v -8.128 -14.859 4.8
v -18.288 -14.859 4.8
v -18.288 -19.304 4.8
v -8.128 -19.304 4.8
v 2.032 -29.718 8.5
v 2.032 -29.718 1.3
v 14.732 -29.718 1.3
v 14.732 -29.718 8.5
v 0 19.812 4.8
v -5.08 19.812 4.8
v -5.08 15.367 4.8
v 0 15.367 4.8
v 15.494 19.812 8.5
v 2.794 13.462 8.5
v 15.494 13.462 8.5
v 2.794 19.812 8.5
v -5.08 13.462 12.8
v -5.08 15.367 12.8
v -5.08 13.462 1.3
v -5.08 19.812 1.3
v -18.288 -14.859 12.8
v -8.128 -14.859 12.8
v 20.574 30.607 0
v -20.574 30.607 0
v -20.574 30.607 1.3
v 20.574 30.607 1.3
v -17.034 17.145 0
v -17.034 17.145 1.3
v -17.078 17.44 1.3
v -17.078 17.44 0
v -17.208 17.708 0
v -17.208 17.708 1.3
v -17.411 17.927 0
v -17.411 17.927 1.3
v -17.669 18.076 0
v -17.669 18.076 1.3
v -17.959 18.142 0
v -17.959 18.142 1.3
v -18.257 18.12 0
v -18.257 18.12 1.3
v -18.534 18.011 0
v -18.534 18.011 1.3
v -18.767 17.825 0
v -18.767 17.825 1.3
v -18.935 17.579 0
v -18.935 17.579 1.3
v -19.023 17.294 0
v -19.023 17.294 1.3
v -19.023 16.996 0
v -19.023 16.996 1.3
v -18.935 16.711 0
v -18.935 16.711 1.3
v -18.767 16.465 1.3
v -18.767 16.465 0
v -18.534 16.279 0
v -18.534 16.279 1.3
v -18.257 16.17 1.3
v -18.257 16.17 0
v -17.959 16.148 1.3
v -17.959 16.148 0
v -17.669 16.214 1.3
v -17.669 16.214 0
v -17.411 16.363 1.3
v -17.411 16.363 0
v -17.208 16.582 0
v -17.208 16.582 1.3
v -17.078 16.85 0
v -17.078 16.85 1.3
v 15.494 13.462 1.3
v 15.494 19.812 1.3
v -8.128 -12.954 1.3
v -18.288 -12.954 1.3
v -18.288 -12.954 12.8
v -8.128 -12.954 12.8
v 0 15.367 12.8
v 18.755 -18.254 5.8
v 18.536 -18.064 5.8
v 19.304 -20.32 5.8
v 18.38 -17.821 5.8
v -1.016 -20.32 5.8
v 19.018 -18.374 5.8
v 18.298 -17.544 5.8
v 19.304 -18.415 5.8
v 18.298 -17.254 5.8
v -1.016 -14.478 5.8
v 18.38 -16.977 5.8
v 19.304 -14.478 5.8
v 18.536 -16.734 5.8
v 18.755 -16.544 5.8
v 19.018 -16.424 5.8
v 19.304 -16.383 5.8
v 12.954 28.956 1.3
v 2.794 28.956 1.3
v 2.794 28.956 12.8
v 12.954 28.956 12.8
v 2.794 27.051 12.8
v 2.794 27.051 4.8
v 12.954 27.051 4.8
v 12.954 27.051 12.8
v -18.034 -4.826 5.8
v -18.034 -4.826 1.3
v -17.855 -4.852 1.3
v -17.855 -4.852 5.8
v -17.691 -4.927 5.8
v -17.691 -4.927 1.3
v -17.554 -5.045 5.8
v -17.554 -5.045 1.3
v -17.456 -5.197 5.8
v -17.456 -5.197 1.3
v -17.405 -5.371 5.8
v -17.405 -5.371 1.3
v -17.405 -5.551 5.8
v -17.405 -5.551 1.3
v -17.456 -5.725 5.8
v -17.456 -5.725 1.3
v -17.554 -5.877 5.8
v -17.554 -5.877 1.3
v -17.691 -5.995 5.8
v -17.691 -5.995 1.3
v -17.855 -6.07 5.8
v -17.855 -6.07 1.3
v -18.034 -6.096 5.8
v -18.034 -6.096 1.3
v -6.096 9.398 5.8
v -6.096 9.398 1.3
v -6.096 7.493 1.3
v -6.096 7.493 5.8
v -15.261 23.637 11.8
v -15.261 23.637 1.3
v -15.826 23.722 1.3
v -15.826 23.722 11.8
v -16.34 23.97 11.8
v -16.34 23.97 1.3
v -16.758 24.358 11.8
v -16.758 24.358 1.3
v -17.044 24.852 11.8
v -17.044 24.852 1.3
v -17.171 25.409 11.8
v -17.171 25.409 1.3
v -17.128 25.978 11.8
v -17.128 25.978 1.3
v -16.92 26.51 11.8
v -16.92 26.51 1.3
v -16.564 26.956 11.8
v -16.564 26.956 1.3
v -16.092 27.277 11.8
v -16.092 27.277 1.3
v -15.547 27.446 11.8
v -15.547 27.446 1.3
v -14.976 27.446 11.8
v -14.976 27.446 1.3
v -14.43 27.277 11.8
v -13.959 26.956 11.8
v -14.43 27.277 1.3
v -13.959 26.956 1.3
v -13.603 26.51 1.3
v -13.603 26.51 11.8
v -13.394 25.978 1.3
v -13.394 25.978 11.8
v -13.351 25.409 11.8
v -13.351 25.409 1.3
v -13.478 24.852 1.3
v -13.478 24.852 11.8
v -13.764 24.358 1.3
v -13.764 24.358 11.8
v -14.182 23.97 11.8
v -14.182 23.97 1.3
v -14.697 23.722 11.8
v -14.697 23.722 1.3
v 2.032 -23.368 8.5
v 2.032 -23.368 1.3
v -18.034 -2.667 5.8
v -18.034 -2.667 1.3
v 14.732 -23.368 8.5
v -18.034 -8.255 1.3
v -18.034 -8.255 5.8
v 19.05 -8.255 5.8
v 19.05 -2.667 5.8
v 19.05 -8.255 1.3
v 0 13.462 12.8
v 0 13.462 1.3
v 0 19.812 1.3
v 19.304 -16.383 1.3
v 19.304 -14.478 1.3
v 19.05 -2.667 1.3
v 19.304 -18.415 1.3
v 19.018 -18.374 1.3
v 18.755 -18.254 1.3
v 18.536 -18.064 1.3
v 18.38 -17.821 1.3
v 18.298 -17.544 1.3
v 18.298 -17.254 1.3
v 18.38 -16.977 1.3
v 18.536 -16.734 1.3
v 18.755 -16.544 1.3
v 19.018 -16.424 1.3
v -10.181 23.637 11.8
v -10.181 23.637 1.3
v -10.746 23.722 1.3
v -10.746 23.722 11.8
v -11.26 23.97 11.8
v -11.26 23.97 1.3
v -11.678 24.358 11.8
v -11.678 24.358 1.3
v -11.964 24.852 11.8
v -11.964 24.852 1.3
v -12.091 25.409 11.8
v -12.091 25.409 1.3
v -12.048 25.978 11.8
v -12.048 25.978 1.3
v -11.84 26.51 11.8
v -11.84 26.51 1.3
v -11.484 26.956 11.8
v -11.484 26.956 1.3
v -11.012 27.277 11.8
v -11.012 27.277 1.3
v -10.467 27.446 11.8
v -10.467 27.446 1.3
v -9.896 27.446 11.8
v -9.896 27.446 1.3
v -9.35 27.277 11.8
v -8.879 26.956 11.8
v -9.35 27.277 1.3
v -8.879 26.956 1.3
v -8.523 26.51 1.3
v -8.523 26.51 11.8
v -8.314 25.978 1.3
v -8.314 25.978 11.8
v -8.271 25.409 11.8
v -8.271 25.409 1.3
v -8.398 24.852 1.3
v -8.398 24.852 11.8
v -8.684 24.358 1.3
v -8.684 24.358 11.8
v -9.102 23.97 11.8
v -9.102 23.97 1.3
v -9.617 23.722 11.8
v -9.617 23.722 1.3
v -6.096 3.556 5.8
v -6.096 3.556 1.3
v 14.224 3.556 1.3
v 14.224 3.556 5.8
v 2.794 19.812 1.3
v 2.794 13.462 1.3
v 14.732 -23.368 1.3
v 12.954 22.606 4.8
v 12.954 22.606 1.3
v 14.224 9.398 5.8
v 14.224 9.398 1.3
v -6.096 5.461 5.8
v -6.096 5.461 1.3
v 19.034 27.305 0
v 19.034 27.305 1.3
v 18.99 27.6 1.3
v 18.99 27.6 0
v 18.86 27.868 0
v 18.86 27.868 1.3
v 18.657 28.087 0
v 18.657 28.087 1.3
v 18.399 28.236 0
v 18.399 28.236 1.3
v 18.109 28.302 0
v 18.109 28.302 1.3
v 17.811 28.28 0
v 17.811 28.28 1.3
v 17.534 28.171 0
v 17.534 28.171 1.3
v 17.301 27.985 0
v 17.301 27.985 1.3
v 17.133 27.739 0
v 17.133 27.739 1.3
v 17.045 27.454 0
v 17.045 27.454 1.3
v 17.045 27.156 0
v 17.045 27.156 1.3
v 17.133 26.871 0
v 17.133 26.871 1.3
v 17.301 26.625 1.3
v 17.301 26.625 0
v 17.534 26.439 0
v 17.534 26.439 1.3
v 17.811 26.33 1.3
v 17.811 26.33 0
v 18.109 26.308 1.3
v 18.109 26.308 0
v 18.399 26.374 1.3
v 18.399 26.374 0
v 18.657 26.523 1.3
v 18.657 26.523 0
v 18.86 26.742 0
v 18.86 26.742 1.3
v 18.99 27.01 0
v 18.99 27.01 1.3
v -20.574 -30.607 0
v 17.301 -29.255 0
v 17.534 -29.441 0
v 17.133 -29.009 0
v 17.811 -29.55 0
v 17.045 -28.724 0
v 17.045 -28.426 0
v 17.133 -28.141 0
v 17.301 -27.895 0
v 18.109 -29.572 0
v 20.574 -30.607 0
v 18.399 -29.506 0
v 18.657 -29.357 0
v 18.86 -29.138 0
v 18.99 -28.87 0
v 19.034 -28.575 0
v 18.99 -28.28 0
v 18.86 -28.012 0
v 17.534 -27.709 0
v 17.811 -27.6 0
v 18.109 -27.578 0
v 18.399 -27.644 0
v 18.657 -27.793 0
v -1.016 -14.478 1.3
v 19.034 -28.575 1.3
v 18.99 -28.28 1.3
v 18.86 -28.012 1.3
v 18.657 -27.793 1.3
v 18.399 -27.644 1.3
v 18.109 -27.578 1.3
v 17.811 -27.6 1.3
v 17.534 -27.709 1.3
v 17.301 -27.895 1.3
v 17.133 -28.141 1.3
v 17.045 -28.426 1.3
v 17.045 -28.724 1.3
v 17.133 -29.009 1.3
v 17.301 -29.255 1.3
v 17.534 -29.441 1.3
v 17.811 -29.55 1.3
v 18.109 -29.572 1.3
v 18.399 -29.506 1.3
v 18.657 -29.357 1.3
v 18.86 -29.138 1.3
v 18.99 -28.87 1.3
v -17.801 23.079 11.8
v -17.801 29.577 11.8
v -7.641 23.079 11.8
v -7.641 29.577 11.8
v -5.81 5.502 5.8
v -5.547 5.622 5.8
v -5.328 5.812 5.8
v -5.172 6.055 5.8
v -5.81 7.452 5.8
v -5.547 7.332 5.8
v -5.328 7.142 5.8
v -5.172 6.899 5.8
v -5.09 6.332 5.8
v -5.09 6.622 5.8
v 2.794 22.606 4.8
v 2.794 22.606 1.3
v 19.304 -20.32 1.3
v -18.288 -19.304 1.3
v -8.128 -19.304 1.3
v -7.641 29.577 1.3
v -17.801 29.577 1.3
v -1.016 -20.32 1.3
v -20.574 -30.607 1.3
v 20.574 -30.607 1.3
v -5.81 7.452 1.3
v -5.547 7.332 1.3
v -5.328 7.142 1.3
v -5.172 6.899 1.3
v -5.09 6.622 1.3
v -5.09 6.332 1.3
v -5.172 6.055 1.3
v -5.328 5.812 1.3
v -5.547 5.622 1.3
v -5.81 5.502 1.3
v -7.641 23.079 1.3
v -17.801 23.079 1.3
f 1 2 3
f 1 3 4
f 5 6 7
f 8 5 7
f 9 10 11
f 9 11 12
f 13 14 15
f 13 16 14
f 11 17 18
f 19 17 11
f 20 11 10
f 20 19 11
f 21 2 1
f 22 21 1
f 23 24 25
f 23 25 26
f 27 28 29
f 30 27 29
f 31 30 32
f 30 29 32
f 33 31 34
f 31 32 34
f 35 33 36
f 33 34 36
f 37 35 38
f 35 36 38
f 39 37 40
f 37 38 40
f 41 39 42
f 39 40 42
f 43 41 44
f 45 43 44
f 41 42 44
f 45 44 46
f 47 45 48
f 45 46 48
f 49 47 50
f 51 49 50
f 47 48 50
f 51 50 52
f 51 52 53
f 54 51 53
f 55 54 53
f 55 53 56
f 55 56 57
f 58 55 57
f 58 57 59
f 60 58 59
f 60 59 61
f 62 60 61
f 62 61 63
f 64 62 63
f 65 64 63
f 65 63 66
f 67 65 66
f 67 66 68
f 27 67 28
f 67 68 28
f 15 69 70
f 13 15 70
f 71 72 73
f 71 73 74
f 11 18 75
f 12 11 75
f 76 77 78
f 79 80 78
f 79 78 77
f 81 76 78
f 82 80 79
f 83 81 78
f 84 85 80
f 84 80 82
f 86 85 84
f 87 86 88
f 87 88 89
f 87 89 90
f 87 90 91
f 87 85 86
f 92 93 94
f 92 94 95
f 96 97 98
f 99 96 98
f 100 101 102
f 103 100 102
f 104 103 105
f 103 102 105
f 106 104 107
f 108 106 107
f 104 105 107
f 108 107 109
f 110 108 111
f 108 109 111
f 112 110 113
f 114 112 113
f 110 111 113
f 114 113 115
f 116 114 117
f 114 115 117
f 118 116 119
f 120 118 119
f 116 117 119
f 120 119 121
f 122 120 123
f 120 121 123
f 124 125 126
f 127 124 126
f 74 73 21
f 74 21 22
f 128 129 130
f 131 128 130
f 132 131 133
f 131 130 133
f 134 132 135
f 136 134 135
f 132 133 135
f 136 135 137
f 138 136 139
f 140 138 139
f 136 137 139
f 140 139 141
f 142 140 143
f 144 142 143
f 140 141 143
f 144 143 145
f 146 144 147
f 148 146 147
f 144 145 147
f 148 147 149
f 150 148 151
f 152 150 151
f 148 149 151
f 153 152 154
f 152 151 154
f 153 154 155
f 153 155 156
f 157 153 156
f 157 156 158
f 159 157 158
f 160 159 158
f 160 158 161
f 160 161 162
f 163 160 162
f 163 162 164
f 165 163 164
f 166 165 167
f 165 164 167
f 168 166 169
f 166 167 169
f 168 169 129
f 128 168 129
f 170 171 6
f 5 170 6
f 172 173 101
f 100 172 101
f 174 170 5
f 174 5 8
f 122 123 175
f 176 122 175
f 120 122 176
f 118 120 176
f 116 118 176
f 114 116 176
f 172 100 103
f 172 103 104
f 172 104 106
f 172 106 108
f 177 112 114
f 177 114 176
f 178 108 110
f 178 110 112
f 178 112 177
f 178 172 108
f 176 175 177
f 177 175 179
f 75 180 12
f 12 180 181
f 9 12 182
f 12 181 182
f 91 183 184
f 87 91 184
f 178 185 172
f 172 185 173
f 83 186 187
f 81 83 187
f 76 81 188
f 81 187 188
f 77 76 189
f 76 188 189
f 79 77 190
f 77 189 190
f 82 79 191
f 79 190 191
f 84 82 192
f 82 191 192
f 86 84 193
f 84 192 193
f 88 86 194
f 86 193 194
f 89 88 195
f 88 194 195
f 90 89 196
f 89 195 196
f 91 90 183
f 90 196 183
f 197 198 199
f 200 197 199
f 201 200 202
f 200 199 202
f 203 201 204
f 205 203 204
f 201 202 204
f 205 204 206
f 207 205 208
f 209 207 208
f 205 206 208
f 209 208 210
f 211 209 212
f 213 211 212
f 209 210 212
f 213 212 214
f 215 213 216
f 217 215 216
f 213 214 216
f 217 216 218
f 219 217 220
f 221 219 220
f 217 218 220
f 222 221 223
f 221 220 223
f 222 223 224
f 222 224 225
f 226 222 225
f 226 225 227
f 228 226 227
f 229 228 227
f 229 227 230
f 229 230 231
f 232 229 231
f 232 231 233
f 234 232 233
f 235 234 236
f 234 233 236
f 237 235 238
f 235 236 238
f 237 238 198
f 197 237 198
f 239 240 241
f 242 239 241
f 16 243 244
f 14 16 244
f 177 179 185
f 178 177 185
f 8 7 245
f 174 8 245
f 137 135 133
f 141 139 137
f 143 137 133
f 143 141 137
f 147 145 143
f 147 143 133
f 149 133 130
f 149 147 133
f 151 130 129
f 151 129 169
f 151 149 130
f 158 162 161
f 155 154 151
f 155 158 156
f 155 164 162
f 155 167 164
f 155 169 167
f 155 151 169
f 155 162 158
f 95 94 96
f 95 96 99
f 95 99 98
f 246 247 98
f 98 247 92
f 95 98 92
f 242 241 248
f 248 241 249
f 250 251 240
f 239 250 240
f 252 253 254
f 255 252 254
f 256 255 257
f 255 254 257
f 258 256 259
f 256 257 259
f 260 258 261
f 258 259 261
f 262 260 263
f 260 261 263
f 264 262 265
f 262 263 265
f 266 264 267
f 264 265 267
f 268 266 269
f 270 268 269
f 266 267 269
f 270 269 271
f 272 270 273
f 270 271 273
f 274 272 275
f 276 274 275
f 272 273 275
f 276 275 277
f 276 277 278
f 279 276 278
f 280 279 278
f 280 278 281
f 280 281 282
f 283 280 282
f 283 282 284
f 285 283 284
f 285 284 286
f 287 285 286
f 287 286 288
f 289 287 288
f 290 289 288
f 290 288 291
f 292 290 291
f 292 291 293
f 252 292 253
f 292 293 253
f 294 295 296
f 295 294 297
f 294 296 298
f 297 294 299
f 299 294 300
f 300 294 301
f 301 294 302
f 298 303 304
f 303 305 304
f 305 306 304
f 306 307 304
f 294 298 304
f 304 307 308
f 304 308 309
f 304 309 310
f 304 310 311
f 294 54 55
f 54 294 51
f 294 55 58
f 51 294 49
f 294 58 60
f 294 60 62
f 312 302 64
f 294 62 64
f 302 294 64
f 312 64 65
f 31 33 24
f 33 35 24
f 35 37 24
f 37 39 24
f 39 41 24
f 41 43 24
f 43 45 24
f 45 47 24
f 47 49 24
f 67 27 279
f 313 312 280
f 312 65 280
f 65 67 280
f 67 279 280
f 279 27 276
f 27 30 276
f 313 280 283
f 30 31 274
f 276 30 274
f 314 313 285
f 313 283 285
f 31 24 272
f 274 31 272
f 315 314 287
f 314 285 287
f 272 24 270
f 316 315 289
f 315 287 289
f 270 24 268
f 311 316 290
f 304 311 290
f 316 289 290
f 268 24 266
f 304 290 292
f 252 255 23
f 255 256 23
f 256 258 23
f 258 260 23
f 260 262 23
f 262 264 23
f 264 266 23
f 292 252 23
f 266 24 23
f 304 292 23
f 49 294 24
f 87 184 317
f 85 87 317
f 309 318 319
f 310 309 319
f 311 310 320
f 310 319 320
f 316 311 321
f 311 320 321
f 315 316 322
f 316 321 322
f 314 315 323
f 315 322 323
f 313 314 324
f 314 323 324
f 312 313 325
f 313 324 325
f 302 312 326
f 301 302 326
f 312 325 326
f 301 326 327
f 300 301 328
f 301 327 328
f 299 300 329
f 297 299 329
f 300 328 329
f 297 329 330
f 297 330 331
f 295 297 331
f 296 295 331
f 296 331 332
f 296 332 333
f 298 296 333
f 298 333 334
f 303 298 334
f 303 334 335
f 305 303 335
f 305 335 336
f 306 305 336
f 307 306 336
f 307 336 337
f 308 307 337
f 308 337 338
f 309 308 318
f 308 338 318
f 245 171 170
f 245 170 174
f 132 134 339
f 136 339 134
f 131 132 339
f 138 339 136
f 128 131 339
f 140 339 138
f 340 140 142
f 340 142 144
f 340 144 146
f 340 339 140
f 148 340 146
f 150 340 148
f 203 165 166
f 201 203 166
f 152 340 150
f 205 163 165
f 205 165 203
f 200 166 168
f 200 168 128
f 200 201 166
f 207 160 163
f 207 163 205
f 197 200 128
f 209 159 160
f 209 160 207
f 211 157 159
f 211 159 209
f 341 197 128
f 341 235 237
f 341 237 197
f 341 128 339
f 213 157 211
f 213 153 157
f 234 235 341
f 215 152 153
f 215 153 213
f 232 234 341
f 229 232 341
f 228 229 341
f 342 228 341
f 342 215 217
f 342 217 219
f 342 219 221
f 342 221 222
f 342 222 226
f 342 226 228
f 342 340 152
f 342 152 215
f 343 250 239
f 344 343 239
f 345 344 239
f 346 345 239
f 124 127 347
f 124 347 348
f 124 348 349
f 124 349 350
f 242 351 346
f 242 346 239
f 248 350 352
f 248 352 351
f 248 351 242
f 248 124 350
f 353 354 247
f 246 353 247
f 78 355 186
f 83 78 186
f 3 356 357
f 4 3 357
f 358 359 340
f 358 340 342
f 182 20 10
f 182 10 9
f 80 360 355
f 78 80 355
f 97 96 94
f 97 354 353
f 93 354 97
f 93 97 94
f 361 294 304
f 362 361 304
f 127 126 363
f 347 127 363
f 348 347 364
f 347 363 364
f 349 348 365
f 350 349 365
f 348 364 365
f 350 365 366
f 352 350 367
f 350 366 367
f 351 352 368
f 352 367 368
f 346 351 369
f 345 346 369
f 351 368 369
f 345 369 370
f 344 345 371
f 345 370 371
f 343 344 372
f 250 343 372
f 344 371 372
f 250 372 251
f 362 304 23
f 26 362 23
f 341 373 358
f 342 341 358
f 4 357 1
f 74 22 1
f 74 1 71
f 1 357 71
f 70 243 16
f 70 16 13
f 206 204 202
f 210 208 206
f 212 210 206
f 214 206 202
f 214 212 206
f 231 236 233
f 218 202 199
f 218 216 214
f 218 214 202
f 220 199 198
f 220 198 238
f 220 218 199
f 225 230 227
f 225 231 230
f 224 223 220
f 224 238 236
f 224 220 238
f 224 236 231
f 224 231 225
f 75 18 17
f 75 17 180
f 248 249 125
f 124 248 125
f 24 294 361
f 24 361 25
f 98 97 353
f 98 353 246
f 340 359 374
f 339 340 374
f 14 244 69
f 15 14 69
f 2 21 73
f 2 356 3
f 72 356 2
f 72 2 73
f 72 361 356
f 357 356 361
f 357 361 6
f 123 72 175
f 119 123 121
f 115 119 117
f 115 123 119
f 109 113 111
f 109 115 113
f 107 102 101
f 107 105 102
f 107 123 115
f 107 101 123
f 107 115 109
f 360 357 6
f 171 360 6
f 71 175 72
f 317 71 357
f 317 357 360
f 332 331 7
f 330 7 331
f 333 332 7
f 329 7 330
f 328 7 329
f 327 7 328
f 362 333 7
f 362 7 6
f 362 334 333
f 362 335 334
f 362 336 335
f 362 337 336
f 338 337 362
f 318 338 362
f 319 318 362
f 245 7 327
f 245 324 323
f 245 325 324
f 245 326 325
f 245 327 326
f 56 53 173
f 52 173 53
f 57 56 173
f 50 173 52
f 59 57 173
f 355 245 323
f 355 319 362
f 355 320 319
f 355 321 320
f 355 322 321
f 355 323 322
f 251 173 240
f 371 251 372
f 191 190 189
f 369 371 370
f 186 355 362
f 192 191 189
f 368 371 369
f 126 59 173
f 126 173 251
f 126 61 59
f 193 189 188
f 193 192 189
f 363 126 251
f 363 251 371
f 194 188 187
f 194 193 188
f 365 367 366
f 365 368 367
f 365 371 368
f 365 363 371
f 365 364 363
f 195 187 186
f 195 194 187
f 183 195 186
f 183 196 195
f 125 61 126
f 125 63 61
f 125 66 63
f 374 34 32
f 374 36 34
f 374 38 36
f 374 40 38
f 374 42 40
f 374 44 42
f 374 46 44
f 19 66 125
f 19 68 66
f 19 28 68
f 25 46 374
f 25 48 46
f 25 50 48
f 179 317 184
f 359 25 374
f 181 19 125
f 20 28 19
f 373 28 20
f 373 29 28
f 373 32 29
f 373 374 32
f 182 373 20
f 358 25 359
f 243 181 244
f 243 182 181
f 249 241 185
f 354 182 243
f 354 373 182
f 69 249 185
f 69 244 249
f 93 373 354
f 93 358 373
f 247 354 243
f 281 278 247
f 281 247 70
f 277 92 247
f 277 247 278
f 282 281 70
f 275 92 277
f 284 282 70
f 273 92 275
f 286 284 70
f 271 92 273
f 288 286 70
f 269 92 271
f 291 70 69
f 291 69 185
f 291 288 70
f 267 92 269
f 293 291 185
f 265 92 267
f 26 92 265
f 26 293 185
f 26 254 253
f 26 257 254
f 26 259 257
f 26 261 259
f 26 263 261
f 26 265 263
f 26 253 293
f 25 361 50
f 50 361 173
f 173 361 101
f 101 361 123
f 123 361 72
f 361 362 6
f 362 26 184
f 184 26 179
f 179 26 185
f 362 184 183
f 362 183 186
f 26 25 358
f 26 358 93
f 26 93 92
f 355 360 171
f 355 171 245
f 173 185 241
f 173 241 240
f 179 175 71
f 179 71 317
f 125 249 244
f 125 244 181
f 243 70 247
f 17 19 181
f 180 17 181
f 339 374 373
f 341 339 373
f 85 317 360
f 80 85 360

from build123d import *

# Parameters (mm, degrees)
F0_W     = 41.148
F0_H     = 61.214
F1_DEPTH = 1.3
F2_R     = 1
F3_DEPTH = 1.3
F4_DEPTH = 4.5
F2_W     = 10.16
F2_H     = 1.5257
F5_DEPTH = 10.5
F2_H_2   = 4.445
F2_W_2   = 5.08
F6_DEPTH = 3.5
F2_H_3   = 1.905
F7_DEPTH = 11.5
F2_W_3   = 12.7
F8_DEPTH = 7.2


with BuildPart() as f1:
    # F0 (on Top) → F1 (new body)
    with BuildSketch(Plane.XY):
        Rectangle(F0_W, F0_H)
    extrude(amount=F1_DEPTH)

    # F2 (on face) → F3 (cut, through all)
    with BuildSketch(Plane.XY.offset(1.3)):
        with Locations((-18.034, 17.145)):
            Circle(F2_R)
        with Locations((18.034, 27.305)):
            Circle(F2_R)
        with Locations((18.034, -28.575)):
            Circle(F2_R)
    extrude(amount=-F3_DEPTH, mode=Mode.SUBTRACT)

    # F2 (on face) → F4 (join)
    with BuildSketch(Plane.XY.offset(1.3)):
        with BuildLine():
            ThreePointArc((-18.034, -4.826), (-17.399, -5.461), (-18.034, -6.096))
            Line((-18.034, -6.096), (-18.034, -8.255))
            Line((-18.034, -8.255), (19.05, -8.255))
            Line((19.05, -8.255), (19.05, -2.667))
            Line((19.05, -2.667), (-18.034, -2.667))
            Line((-18.034, -2.667), (-18.034, -4.826))
        make_face()
        with BuildLine():
            Line((14.224, 3.556), (14.224, 9.398))
            Line((14.224, 9.398), (-6.096, 9.398))
            Line((-6.096, 9.398), (-6.096, 7.493))
            ThreePointArc((-6.096, 7.493), (-5.08, 6.477), (-6.096, 5.461))
            Line((-6.096, 5.461), (-6.096, 3.556))
            Line((-6.096, 3.556), (14.224, 3.556))
        make_face()
        with BuildLine():
            Line((-1.016, -14.478), (-1.016, -20.32))
            Line((-1.016, -20.32), (19.304, -20.32))
            Line((19.304, -20.32), (19.304, -18.415))
            ThreePointArc((19.304, -18.415), (18.288, -17.399), (19.304, -16.383))
            Line((19.304, -16.383), (19.304, -14.478))
            Line((19.304, -14.478), (-1.016, -14.478))
        make_face()
    extrude(amount=F4_DEPTH)

    # F2 (on face) → F5 (join)
    with BuildSketch(Plane.XY.offset(1.3)):
        with Locations((-12.7211, 28.81415)):
            Rectangle(F2_W, F2_H)
        Polygon((-7.6411, 28.0513), (-17.8011, 28.0513), (-17.8011, 27.5683), (-17.8011, 23.5715), (-17.8011, 23.0791), (-7.6411, 23.0791), (-7.6411, 23.5715), (-7.6411, 27.5683), align=None)
        with BuildLine():
            ThreePointArc((-15.2611, 27.467), (-13.3461, 25.552), (-15.2611, 23.637))
            ThreePointArc((-15.2611, 23.637), (-17.1761, 25.552), (-15.2611, 27.467))
        make_face(mode=Mode.SUBTRACT)
        with BuildLine():
            ThreePointArc((-10.1811, 27.467), (-8.2661, 25.552), (-10.1811, 23.637))
            ThreePointArc((-10.1811, 23.637), (-12.0961, 25.552), (-10.1811, 27.467))
        make_face(mode=Mode.SUBTRACT)
    extrude(amount=F5_DEPTH)

    # F2 (on face) → F6 (join)
    with BuildSketch(Plane.XY.offset(1.3)):
        with Locations((7.874, 24.8285)):
            Rectangle(F2_W, F2_H_2)
        with Locations((-2.54, 17.5895)):
            Rectangle(F2_W_2, F2_H_2)
        with Locations((-13.208, -17.0815)):
            Rectangle(F2_W, F2_H_2)
    extrude(amount=F6_DEPTH)

    # F2 (on face) → F7 (join)
    with BuildSketch(Plane.XY.offset(1.3)):
        with Locations((7.874, 28.0035)):
            Rectangle(F2_W, F2_H_3)
        with Locations((-2.54, 14.4145)):
            Rectangle(F2_W_2, F2_H_3)
        with Locations((-13.208, -13.9065)):
            Rectangle(F2_W, F2_H_3)
    extrude(amount=F7_DEPTH)

    # F2 (on face) → F8 (join)
    with BuildSketch(Plane.XY.offset(1.3)):
        with Locations((9.144, 15.6845)):
            Rectangle(F2_W_3, F2_H_2)
        with Locations((9.144, 18.8595)):
            Rectangle(F2_W_3, F2_H_3)
        with Locations((8.382, -25.5905)):
            Rectangle(F2_W_3, F2_H_2)
        with Locations((8.382, -28.7655)):
            Rectangle(F2_W_3, F2_H_3)
    extrude(amount=F8_DEPTH)


solid = f1.part
